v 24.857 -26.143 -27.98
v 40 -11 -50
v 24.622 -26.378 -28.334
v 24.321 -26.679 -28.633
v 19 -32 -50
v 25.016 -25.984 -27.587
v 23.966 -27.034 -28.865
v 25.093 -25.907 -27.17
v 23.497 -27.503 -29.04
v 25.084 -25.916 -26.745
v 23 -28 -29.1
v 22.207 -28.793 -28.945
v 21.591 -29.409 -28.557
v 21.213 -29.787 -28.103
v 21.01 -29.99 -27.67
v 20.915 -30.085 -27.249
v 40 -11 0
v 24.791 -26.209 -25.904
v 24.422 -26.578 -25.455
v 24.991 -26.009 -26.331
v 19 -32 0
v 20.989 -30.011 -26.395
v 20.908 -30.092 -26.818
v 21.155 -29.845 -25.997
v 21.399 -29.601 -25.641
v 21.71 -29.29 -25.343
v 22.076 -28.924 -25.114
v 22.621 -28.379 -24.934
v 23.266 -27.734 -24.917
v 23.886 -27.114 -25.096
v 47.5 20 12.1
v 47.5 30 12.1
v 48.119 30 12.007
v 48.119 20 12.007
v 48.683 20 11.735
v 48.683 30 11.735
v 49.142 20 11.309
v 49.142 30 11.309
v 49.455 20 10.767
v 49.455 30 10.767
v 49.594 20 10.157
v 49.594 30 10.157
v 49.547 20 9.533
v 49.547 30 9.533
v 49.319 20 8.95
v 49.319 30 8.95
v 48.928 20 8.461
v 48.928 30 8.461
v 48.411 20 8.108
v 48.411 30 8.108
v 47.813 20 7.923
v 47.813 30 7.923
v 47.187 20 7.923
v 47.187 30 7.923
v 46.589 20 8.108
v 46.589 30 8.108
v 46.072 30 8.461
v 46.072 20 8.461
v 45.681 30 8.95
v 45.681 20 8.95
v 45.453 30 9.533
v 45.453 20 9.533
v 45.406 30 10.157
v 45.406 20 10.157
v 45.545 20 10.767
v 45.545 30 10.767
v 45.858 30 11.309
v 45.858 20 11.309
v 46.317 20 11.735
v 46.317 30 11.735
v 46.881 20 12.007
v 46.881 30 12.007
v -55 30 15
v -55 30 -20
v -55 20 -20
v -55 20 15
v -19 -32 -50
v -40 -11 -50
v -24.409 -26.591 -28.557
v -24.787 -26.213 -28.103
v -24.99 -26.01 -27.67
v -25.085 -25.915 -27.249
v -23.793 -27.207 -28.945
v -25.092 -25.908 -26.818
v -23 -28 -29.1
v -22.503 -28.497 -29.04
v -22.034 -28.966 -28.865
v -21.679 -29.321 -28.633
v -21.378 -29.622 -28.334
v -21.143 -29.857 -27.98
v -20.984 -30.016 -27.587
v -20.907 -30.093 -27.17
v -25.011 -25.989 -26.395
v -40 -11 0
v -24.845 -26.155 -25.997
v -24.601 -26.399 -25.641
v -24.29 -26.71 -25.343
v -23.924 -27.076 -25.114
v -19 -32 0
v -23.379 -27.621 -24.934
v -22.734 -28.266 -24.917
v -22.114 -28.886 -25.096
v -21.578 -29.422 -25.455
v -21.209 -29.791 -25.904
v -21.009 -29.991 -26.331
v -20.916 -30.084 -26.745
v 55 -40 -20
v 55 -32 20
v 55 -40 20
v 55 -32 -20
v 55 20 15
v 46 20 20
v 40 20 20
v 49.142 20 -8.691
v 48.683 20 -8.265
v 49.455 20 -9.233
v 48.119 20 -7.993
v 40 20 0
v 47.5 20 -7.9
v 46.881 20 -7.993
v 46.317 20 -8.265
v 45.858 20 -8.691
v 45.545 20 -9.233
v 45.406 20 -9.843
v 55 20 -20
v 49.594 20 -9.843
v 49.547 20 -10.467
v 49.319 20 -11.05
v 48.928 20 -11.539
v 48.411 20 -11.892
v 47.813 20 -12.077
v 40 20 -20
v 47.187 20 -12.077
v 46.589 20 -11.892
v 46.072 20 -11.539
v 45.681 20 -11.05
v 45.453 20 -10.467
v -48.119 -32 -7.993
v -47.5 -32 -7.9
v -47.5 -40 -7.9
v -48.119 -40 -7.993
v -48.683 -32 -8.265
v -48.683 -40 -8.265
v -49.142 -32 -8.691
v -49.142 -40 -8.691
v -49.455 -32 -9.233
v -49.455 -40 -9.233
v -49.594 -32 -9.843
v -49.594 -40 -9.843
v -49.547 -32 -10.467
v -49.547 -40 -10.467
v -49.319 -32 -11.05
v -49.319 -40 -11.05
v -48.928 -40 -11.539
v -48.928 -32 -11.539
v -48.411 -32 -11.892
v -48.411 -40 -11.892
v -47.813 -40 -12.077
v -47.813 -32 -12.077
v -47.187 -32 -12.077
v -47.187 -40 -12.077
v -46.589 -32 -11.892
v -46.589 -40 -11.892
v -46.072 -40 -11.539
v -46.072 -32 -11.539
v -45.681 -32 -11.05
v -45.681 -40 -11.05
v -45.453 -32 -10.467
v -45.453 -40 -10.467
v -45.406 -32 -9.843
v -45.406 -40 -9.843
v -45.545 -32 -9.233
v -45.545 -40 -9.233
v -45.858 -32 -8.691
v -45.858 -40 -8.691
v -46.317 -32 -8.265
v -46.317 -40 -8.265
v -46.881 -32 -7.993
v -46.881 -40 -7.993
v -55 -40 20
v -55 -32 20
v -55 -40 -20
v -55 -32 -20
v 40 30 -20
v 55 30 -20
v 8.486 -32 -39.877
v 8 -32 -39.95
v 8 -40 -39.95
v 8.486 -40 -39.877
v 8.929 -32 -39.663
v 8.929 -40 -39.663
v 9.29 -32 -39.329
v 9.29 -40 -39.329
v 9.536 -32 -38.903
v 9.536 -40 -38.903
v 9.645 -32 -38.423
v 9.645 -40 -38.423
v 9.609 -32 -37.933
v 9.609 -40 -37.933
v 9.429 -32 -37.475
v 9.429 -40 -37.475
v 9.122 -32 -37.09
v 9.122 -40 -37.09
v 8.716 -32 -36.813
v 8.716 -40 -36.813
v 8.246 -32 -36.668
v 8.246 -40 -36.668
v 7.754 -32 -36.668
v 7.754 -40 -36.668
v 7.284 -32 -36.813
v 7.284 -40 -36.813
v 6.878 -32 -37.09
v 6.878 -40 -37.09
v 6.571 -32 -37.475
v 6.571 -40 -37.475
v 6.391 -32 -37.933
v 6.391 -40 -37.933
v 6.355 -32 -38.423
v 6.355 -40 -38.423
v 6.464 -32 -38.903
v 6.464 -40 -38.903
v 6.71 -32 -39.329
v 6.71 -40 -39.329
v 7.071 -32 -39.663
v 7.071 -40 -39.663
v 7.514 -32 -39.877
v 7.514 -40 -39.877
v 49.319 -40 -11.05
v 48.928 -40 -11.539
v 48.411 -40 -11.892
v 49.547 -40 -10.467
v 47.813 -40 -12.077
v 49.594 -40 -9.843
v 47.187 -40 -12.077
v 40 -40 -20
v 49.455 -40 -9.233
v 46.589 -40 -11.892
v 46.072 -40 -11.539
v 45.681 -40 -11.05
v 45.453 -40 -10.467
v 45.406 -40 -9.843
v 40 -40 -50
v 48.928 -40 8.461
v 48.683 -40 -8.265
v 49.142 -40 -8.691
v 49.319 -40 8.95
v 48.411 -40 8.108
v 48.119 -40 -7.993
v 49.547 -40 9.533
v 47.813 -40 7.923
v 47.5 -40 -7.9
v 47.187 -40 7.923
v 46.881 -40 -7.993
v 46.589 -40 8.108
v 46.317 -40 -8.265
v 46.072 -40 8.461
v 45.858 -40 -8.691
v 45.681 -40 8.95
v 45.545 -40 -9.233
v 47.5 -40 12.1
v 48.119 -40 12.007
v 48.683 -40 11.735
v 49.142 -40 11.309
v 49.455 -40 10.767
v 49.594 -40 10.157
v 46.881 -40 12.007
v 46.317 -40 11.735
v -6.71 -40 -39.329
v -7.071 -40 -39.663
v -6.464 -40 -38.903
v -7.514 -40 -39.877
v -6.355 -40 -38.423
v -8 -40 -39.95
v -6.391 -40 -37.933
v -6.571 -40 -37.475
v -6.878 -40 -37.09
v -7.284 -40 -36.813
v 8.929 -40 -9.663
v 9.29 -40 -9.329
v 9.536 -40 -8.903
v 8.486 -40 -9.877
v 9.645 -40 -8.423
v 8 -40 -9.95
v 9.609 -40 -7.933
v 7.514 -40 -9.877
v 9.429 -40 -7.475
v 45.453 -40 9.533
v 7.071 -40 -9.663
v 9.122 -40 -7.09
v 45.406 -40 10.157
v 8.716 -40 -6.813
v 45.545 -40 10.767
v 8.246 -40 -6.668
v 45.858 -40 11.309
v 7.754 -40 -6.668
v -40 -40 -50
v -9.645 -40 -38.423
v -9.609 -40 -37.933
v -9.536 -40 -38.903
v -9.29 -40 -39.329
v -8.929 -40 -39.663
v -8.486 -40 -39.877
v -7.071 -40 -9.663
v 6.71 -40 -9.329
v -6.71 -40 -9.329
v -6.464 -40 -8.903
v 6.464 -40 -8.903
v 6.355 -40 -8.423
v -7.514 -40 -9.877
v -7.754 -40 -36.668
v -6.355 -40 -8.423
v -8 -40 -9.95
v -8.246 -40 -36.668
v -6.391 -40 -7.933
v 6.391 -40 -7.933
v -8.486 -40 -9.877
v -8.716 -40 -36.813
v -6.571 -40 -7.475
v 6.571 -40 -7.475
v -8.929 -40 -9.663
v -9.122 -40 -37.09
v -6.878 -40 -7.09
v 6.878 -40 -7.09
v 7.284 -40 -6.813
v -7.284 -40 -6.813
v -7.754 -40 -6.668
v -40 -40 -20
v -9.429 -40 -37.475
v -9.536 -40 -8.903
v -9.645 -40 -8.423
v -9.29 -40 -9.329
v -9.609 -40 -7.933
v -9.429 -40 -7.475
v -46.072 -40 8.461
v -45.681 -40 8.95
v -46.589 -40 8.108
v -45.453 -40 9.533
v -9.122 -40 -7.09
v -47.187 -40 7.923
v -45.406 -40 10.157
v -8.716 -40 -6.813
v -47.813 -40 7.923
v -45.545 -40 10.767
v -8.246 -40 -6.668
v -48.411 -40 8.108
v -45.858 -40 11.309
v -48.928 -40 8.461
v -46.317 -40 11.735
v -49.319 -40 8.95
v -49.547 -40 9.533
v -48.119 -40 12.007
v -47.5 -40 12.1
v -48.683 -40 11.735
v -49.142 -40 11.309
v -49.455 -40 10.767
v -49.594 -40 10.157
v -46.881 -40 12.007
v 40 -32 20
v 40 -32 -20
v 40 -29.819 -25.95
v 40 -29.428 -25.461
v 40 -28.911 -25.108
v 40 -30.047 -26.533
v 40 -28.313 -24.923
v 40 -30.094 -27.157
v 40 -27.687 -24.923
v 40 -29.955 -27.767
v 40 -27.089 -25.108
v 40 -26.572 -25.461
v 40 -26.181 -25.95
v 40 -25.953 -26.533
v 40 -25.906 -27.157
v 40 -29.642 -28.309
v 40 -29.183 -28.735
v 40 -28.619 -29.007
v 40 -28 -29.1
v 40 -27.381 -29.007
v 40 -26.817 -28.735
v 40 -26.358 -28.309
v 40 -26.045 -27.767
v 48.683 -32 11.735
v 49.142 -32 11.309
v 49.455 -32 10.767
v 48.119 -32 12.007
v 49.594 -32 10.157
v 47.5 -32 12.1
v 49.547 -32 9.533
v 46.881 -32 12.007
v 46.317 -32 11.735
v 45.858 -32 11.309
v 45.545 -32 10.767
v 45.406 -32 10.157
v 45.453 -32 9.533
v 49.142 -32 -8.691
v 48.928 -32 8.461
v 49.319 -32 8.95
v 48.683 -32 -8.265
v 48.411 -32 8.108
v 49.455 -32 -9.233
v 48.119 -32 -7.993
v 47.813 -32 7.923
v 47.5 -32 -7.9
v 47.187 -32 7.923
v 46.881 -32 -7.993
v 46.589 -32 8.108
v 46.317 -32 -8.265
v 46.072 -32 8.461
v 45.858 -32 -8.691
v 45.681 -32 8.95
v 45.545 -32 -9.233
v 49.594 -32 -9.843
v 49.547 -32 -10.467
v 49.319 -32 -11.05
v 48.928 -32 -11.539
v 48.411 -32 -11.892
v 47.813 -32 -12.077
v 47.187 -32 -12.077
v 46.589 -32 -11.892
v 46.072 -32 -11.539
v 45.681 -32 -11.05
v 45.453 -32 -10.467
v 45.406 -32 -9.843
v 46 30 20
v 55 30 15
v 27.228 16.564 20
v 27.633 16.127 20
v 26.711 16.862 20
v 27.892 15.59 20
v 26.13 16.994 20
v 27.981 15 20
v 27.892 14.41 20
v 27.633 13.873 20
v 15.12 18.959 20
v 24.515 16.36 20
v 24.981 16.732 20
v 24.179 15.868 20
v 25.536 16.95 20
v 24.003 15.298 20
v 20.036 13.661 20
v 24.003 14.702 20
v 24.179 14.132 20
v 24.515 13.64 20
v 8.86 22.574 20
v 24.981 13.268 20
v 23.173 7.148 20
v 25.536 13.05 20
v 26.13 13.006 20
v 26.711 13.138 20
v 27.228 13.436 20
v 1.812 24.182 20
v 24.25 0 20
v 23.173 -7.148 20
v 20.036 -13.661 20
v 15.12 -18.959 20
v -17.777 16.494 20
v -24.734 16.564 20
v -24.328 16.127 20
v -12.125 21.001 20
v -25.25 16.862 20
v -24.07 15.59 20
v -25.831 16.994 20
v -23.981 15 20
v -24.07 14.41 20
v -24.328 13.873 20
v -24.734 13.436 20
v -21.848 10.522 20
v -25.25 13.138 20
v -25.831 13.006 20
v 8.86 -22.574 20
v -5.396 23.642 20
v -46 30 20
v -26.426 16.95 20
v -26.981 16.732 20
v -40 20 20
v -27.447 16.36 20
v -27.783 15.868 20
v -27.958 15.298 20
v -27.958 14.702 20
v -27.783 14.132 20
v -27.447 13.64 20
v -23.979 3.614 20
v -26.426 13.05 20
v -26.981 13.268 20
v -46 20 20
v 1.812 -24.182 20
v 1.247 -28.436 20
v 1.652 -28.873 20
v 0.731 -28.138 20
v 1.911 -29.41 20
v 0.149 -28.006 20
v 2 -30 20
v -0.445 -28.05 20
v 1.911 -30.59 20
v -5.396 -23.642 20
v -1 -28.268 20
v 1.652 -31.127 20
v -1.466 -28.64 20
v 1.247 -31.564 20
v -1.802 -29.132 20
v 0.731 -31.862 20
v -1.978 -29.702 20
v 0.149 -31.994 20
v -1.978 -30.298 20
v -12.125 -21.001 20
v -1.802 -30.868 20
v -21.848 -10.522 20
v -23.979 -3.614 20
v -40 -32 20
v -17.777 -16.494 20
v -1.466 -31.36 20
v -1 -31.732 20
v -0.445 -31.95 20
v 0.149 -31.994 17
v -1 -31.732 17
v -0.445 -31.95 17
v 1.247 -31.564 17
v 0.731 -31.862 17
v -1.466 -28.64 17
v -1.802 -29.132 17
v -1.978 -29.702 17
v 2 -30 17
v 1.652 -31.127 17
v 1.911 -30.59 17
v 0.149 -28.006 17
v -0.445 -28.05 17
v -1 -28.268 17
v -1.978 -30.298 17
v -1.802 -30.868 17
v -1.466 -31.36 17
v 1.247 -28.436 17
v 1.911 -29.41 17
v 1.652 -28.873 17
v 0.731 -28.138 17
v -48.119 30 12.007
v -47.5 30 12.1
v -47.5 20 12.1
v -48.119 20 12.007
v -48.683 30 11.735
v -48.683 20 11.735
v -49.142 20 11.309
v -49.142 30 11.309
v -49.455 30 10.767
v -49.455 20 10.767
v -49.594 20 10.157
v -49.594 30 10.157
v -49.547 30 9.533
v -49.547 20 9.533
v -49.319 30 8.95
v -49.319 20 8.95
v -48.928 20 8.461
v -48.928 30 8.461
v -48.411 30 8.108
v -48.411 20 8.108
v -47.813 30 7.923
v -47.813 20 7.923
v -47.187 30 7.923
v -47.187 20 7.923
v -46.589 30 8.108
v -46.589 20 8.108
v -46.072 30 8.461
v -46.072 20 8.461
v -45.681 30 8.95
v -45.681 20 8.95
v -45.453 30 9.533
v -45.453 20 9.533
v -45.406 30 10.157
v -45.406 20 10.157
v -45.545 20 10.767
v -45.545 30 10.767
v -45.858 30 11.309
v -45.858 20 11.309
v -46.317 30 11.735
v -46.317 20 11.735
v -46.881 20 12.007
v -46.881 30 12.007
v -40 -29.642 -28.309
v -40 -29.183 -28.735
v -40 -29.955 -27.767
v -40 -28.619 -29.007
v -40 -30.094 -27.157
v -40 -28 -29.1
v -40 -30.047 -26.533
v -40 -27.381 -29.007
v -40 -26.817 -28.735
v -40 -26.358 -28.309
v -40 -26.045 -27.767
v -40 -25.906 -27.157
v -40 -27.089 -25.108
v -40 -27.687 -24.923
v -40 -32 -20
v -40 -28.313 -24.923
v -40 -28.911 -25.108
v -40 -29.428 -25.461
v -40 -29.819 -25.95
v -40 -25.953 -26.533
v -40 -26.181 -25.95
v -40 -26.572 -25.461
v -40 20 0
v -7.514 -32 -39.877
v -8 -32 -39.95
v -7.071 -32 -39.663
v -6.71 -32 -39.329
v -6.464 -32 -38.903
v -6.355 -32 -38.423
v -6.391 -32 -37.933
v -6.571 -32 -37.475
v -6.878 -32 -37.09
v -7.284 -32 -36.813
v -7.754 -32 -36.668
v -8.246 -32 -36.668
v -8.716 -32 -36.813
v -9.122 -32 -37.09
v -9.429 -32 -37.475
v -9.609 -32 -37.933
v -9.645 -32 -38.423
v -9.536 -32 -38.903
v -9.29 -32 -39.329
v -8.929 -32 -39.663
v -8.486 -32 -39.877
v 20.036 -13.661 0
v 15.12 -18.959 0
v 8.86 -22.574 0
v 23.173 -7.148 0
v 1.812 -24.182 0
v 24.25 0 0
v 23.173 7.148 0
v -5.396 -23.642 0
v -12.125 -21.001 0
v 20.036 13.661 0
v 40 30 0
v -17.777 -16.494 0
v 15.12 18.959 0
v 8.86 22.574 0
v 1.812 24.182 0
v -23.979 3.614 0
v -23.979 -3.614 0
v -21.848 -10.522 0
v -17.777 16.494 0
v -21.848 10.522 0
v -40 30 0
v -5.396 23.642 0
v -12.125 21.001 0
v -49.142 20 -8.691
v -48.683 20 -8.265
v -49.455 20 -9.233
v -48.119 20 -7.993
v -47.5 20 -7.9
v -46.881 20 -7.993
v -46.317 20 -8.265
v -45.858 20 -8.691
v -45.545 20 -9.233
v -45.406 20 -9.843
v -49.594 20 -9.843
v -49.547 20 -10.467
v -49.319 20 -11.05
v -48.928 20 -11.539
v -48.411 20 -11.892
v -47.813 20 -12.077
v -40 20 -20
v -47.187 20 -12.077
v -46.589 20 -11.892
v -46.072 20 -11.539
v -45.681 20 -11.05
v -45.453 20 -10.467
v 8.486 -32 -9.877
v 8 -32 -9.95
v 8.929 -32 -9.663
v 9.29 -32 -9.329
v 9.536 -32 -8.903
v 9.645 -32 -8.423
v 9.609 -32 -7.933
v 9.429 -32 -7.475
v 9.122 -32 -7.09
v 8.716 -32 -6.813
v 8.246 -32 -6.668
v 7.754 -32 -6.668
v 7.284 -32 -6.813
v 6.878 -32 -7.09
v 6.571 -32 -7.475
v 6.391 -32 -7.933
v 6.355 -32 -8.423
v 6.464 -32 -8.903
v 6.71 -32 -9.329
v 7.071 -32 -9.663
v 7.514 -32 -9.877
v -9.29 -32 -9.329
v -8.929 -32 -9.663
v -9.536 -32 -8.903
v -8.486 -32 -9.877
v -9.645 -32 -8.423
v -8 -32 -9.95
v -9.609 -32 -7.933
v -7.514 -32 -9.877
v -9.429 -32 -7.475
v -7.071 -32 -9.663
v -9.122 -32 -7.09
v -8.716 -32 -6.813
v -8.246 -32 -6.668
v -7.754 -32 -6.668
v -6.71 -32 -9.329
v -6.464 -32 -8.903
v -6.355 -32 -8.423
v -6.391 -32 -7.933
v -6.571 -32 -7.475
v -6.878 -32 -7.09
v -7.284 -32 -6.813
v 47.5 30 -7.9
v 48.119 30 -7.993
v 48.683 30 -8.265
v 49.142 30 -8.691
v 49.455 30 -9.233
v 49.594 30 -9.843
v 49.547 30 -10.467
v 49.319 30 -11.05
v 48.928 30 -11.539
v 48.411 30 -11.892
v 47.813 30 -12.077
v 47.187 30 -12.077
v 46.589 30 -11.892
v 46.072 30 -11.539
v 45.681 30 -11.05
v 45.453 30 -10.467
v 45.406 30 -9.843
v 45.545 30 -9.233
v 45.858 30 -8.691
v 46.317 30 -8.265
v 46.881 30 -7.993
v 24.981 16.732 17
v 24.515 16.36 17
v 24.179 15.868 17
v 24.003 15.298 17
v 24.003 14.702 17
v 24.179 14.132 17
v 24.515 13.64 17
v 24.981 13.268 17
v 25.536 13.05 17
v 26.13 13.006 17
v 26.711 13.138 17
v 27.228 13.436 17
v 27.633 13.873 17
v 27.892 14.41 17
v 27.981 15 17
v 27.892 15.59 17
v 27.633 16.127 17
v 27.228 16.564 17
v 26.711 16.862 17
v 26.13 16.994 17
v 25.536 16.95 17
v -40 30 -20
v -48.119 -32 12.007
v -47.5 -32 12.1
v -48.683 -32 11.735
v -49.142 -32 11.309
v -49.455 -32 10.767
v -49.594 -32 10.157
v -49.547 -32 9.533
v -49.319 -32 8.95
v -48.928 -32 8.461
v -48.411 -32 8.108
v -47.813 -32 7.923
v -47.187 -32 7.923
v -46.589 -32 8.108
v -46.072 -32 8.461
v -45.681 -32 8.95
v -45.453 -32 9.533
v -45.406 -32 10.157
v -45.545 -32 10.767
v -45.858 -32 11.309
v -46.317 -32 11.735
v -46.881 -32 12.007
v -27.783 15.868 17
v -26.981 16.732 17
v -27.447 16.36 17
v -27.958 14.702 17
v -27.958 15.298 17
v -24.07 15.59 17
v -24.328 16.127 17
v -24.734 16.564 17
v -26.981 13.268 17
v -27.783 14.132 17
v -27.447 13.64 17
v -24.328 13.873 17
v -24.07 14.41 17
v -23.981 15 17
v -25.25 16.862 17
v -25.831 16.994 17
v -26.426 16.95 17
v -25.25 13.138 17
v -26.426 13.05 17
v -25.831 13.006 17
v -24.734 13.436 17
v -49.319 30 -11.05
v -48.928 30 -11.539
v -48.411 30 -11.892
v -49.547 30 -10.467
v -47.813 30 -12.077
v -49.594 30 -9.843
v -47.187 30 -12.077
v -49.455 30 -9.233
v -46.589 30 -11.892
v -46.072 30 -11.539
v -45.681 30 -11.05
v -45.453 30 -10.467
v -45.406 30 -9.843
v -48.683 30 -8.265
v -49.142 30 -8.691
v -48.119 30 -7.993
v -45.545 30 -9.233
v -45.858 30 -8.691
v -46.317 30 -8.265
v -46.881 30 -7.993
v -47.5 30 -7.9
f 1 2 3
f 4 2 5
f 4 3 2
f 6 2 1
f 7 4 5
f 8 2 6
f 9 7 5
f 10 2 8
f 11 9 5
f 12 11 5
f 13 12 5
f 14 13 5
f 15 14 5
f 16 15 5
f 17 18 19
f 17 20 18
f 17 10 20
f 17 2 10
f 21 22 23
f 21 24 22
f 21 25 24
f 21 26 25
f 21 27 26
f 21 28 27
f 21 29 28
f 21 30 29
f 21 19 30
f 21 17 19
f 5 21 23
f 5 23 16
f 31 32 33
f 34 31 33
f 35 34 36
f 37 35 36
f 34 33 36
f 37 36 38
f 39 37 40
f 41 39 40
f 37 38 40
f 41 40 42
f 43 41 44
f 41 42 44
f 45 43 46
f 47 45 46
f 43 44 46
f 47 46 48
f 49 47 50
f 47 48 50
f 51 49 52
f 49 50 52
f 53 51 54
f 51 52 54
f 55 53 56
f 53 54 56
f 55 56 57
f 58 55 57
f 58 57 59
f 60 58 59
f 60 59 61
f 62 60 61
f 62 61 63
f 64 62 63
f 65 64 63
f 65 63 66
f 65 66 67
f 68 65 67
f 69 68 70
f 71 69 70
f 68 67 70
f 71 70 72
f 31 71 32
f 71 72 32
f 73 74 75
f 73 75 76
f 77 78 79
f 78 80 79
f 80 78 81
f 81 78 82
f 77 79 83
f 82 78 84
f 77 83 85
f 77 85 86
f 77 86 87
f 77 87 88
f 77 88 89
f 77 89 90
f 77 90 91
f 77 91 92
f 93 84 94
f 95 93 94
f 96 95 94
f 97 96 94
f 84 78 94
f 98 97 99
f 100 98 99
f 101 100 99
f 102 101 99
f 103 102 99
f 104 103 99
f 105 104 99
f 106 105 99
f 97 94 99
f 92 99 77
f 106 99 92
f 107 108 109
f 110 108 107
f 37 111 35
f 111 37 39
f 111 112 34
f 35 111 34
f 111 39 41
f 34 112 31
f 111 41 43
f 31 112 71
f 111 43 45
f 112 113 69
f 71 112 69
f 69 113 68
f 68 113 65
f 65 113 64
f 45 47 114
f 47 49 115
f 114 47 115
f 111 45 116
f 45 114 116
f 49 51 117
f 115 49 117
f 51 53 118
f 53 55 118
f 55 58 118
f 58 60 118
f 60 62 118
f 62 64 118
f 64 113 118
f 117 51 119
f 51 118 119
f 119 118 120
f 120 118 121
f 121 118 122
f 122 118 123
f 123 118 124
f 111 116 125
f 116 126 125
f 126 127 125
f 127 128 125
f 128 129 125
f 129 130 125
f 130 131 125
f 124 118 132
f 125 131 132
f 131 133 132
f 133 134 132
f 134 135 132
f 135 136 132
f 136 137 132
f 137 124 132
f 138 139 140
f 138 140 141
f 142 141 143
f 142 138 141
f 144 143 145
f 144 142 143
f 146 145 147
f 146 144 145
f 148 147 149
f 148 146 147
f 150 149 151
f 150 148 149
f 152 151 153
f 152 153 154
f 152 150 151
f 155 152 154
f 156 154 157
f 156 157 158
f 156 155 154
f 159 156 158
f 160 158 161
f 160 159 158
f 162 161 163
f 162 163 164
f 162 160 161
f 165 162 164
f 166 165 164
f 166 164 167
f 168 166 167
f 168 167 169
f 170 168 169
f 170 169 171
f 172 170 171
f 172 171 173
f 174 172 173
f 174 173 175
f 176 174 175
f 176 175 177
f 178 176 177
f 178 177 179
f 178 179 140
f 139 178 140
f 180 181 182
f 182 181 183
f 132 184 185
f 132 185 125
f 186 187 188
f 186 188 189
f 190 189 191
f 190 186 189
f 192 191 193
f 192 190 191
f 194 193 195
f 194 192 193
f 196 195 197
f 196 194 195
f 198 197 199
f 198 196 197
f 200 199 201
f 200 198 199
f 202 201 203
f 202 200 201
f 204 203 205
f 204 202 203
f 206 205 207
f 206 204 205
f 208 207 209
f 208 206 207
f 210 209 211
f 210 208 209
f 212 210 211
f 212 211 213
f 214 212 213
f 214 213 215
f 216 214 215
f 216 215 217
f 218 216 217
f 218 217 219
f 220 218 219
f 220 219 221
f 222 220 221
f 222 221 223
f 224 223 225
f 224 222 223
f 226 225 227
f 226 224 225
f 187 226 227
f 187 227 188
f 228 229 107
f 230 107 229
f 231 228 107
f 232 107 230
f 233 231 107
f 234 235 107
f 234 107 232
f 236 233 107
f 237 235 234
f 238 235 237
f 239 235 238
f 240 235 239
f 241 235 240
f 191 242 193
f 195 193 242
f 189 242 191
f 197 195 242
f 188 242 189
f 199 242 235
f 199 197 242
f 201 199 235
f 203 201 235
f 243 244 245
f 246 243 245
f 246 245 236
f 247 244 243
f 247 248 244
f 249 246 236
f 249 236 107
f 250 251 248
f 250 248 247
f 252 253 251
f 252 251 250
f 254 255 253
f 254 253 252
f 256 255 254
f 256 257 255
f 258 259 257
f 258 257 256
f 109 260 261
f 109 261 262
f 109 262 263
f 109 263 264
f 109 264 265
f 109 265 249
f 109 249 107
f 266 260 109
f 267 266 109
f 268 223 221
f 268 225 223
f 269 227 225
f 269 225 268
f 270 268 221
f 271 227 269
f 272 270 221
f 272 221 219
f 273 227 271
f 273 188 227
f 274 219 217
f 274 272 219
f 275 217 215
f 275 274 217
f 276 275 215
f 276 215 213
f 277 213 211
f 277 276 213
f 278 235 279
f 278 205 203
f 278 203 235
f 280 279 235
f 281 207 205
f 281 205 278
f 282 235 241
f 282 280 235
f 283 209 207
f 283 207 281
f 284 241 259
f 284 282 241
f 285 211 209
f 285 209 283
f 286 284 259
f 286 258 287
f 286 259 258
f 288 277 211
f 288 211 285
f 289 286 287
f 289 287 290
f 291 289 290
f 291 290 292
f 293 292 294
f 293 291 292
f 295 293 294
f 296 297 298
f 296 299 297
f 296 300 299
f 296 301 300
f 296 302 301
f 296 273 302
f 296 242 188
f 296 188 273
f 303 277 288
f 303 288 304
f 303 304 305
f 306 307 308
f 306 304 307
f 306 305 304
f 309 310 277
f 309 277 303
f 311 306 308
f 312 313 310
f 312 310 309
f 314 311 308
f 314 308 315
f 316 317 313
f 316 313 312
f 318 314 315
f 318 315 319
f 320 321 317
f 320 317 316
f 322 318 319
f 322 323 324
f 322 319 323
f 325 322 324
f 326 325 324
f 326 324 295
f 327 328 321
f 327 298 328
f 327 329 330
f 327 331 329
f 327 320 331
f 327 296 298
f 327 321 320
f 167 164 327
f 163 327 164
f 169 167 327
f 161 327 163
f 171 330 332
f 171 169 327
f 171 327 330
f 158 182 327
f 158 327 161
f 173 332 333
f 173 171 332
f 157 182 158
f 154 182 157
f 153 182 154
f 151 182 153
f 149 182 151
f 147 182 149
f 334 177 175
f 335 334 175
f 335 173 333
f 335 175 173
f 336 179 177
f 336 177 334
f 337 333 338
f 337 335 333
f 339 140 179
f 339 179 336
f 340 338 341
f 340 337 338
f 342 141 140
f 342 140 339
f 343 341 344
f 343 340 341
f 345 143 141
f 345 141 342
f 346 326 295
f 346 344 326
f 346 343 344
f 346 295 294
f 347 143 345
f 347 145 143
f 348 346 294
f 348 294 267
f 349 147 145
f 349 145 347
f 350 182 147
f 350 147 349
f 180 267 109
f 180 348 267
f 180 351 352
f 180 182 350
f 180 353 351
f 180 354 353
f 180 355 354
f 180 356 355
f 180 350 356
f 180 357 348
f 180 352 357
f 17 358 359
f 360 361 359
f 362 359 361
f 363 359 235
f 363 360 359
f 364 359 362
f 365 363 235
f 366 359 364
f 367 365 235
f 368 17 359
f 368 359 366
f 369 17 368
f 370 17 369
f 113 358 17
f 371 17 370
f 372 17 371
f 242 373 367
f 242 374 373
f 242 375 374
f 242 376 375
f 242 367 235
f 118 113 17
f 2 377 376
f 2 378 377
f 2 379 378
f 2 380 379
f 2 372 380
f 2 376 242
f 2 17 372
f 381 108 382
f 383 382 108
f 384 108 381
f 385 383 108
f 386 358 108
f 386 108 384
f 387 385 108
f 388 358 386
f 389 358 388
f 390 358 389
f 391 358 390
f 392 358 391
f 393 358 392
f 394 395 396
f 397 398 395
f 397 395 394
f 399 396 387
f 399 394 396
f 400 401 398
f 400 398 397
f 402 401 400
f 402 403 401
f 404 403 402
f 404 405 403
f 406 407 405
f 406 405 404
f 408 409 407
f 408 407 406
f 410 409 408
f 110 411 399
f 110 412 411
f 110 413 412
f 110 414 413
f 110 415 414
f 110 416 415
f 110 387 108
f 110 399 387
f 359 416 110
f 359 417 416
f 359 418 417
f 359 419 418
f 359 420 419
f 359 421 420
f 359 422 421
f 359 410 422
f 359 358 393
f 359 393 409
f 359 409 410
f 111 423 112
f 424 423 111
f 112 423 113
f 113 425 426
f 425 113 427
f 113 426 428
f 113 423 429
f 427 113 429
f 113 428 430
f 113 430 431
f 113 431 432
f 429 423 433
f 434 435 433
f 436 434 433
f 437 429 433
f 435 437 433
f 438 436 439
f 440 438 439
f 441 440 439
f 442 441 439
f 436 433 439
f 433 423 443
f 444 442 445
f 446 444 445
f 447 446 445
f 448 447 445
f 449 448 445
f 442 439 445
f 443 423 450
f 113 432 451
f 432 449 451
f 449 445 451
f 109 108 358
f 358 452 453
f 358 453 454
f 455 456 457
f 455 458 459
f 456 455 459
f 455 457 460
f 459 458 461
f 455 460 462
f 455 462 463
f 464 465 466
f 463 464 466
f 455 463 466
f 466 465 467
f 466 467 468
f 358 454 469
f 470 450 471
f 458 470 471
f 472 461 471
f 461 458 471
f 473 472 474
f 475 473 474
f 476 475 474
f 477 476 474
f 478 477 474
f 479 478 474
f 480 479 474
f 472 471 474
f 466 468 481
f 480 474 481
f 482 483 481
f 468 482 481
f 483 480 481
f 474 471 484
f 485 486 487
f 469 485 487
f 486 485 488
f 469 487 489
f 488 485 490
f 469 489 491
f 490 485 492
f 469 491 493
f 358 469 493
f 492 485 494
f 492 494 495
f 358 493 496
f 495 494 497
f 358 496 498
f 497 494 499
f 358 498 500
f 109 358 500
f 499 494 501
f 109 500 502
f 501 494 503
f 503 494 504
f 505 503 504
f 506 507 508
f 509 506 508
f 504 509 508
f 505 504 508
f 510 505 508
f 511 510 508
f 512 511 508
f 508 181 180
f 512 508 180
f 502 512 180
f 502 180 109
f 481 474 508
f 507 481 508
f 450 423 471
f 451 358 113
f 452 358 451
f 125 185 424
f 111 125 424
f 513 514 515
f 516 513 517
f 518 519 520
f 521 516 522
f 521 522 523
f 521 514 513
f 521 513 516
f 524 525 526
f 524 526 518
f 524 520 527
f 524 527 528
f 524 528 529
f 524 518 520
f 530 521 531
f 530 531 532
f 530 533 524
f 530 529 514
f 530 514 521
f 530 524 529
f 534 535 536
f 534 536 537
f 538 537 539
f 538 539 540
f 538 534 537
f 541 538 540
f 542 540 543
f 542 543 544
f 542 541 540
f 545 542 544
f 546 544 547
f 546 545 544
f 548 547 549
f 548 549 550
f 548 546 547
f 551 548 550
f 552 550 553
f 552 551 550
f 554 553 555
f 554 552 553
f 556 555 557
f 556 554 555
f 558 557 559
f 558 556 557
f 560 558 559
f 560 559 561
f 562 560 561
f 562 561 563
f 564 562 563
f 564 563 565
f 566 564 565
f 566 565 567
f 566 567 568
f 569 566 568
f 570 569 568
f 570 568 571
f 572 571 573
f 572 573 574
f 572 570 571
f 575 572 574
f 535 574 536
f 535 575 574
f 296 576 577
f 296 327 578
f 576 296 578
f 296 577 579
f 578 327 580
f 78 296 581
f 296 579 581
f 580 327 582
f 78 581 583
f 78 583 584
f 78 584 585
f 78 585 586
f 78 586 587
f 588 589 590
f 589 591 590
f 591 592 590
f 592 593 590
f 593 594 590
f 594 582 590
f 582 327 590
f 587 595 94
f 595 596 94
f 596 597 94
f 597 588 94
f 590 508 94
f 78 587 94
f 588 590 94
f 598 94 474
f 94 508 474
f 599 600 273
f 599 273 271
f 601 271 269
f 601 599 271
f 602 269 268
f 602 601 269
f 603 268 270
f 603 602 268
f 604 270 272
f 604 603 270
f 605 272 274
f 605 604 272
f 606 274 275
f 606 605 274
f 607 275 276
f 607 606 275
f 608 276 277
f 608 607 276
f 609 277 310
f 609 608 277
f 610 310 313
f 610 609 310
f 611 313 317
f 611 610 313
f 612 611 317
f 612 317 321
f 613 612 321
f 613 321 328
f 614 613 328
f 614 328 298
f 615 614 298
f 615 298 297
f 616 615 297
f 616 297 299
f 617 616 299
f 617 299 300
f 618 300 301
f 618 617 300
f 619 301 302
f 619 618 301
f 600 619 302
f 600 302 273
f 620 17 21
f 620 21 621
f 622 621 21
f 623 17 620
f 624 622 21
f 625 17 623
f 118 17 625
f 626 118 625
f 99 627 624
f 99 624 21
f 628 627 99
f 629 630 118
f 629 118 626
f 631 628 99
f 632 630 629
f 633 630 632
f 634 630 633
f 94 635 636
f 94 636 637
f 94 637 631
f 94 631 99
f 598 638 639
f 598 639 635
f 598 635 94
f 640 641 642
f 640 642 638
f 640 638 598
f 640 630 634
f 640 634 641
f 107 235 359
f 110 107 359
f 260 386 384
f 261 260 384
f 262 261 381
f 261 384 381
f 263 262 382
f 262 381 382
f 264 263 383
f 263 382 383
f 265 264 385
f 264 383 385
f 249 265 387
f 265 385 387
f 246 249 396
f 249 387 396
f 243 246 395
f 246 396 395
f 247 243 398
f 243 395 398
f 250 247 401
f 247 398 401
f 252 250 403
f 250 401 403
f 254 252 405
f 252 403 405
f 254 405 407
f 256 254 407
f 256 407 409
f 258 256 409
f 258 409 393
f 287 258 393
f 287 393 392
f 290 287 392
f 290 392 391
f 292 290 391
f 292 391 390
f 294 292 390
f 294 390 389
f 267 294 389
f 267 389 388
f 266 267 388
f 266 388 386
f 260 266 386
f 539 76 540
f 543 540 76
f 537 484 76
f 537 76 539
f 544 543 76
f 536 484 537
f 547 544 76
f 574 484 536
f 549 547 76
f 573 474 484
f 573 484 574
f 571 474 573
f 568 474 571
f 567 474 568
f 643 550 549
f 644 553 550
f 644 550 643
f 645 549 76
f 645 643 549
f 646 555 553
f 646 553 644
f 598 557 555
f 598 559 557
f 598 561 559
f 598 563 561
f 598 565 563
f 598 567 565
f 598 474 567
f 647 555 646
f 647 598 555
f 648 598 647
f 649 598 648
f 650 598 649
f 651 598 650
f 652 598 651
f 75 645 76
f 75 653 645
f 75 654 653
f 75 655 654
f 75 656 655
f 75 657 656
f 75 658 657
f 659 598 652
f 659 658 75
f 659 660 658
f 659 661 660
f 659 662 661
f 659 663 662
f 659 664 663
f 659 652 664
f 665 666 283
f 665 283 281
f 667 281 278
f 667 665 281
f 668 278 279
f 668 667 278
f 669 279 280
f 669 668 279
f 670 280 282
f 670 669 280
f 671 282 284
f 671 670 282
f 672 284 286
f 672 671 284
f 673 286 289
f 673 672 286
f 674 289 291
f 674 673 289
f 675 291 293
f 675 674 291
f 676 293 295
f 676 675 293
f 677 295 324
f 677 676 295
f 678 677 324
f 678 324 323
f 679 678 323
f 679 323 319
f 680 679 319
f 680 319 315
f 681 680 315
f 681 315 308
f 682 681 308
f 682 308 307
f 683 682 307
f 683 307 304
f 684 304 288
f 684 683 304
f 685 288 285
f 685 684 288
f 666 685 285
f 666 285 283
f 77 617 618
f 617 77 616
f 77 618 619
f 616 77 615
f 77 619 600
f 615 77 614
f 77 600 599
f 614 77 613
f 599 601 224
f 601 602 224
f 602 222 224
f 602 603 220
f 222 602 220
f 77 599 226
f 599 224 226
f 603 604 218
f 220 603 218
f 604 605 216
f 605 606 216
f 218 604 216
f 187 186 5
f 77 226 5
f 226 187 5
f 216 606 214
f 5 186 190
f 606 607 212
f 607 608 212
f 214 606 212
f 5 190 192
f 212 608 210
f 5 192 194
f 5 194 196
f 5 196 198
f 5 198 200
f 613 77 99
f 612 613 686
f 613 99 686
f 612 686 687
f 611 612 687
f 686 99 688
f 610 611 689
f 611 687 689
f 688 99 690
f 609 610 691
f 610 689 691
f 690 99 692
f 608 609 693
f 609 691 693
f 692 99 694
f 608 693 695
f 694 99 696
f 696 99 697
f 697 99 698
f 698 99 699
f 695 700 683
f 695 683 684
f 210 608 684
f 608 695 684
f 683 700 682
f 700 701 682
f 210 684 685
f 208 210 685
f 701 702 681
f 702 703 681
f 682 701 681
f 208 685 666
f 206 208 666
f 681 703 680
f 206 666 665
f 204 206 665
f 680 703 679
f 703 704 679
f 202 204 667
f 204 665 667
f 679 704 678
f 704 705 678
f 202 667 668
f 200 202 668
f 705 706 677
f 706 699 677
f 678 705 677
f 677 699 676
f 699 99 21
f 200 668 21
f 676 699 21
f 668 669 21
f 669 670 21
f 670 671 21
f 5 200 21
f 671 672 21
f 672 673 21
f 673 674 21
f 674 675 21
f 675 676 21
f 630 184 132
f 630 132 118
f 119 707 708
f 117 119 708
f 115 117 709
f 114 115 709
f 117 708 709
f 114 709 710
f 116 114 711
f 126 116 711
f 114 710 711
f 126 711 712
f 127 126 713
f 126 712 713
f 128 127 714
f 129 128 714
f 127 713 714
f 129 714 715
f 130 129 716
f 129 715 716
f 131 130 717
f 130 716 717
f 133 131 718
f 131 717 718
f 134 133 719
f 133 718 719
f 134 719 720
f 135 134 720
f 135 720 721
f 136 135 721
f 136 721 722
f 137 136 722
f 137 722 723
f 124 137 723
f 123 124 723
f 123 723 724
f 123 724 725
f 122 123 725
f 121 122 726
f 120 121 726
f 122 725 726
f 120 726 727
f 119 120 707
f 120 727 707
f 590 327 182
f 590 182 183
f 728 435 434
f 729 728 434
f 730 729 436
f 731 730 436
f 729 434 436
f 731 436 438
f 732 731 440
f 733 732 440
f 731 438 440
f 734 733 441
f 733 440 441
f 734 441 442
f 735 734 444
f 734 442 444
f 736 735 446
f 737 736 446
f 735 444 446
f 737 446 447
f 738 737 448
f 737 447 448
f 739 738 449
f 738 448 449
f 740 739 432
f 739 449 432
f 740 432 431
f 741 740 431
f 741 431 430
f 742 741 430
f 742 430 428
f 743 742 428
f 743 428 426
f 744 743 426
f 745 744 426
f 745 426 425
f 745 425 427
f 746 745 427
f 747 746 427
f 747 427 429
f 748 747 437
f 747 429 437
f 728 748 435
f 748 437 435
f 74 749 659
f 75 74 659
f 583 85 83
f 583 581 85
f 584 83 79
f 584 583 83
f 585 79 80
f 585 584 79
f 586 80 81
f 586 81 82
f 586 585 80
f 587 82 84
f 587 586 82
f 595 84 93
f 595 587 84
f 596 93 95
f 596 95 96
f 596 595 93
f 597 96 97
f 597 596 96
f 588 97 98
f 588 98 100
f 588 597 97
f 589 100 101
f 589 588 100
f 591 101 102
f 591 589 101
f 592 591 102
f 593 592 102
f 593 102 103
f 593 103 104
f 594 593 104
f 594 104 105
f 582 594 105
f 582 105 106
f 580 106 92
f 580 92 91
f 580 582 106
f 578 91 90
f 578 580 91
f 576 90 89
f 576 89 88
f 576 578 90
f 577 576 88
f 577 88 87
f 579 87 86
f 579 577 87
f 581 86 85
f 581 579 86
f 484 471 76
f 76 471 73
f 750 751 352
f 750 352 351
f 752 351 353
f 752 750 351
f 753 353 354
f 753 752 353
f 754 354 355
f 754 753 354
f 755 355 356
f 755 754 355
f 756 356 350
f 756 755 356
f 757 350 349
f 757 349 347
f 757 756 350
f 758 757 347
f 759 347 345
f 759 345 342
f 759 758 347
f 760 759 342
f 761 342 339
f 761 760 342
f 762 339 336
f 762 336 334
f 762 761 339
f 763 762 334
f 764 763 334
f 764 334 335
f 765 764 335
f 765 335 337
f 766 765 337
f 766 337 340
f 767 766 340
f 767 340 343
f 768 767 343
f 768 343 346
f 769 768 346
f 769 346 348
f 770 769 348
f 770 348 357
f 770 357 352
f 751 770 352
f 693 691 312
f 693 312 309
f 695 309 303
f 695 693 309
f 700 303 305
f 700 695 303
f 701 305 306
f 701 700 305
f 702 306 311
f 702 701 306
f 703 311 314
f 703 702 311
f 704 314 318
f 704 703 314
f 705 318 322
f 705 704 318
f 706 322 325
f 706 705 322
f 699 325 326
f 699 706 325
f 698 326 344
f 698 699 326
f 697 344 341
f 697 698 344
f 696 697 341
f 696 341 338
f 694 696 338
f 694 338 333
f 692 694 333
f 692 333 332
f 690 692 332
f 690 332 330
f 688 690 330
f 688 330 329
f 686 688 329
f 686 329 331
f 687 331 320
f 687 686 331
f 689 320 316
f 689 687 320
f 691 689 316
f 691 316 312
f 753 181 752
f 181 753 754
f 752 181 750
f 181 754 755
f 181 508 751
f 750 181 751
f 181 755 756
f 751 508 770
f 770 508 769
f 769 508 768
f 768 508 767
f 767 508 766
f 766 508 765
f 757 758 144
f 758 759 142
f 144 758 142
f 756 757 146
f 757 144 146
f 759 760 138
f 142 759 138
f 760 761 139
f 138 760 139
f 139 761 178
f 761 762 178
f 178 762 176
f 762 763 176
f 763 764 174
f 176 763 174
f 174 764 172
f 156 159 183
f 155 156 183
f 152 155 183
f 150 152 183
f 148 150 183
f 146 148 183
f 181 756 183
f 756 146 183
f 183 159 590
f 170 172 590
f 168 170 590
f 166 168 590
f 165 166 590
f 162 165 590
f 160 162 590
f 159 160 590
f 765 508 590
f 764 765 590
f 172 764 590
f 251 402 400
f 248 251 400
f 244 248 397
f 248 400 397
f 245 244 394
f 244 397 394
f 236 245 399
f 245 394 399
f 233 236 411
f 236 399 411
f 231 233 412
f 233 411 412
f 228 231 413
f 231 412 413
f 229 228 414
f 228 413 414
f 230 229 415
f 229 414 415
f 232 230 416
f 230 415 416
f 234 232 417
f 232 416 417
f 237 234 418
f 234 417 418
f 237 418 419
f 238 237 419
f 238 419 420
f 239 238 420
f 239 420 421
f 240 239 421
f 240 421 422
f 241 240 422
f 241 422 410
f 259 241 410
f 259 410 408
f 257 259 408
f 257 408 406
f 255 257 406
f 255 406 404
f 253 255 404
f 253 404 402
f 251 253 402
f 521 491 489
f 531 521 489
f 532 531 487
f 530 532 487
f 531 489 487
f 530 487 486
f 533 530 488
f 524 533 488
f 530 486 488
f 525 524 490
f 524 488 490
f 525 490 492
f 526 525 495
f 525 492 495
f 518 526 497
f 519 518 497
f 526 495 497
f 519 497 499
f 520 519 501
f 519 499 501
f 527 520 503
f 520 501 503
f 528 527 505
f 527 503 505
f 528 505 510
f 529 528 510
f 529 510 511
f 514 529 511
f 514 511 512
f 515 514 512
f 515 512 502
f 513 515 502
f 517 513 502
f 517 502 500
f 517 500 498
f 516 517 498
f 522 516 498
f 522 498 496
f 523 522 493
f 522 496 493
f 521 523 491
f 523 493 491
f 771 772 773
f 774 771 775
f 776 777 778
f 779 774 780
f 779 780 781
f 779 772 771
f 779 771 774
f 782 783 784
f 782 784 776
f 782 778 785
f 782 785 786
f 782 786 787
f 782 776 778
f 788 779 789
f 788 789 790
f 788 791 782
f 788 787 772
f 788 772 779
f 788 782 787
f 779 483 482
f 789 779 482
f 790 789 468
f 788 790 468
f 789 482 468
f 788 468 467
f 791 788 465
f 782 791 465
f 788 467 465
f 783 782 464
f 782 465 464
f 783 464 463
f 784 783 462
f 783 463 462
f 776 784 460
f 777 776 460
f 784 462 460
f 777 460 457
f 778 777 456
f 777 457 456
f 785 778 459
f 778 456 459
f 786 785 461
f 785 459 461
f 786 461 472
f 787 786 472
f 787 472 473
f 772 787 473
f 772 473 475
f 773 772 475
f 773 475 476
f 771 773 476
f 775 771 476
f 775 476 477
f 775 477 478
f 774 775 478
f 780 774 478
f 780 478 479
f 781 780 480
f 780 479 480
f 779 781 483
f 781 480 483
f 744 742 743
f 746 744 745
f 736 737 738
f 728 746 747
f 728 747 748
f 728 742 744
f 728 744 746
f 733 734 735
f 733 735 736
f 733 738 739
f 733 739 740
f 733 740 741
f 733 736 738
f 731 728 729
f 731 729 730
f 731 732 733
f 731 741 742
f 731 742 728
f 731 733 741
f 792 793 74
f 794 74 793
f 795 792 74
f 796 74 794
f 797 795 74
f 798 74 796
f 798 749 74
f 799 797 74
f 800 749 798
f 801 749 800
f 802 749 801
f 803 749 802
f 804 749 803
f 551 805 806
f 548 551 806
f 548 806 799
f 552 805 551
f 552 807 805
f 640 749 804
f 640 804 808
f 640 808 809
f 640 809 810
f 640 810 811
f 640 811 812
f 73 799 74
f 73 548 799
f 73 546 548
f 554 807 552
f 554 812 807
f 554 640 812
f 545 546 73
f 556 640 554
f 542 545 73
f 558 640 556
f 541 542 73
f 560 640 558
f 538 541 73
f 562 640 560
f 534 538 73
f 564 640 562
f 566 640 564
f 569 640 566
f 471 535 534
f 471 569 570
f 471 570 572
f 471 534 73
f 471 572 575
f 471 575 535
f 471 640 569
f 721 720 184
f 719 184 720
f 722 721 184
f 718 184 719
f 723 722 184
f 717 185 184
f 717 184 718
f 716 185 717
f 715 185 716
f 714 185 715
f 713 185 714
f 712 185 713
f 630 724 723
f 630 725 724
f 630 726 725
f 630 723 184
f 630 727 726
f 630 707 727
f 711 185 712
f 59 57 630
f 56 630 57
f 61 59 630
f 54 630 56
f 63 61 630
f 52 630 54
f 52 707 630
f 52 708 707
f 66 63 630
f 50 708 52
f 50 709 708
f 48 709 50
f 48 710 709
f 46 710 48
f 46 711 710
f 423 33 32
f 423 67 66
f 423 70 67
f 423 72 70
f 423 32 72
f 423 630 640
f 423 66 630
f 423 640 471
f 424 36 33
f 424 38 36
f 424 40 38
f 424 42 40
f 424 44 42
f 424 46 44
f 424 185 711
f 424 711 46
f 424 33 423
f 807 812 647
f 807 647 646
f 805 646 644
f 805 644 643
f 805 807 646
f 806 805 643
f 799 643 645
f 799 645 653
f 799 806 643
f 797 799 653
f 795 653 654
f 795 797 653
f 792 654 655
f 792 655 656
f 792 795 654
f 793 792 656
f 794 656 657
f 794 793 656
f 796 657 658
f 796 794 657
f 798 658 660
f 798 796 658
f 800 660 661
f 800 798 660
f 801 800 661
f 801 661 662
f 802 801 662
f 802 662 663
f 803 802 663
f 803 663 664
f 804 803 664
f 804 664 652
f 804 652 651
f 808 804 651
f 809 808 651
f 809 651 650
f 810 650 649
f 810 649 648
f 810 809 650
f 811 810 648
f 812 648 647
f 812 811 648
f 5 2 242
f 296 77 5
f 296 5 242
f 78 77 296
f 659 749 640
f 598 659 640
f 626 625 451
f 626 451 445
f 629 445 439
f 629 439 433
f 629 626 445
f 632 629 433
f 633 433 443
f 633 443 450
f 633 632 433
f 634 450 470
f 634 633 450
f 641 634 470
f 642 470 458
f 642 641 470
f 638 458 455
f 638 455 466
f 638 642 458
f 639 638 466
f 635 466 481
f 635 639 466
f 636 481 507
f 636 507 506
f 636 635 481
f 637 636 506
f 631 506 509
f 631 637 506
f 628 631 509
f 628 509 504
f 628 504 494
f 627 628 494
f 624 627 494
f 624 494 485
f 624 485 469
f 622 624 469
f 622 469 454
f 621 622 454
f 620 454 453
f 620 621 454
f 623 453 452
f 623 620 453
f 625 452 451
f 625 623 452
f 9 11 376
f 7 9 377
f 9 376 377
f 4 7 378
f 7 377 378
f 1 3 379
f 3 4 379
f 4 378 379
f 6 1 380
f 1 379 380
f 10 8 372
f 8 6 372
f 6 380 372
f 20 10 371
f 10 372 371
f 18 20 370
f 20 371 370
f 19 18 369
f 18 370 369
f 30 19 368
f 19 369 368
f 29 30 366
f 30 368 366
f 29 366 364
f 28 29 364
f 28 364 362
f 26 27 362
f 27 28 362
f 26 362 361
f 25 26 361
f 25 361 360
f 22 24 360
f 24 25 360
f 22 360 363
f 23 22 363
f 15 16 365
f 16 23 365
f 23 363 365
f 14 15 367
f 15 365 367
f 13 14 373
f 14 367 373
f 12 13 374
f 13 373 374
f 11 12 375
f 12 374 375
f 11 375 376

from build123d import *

# Parameters (mm, degrees)
SKETCH1_W           = 80
SKETCH1_H           = 60
SKETCH1_R           = 24.25
BOSS_EXTRUDE1_DEPTH = 20
BOSS_EXTRUDE3_DEPTH = 15
SKETCH5_R           = 2.1
CUT_EXTRUDE2_DEPTH  = 10
SKETCH6_W           = 80
SKETCH6_H           = 20
BOSS_EXTRUDE4_DEPTH = 2
BOSS_EXTRUDE6_DEPTH = 50
SKETCH9_R           = 2.1
CUT_EXTRUDE3_DEPTH  = 100.619275243
SKETCH12_W          = 80
SKETCH12_H          = 70
SKETCH12_R          = 1.65
BOSS_EXTRUDE8_DEPTH = 8
BOSS_EXTRUDE9_DEPTH = 15
CUT_EXTRUDE4_START  = -10
SKETCH14_R          = 2.1
CUT_EXTRUDE4_DEPTH  = 10
SKETCH16_R          = 2
CUT_EXTRUDE5_DEPTH  = 3
CIRPATTERN1_COUNT   = 3


with BuildPart() as part:
    # Sketch1 → Boss-Extrude1 (new body)
    with BuildSketch(Plane.XY):
        Rectangle(SKETCH1_W, SKETCH1_H)
        Circle(SKETCH1_R, mode=Mode.SUBTRACT)
    extrude(amount=BOSS_EXTRUDE1_DEPTH)

    # Sketch4 → Boss-Extrude3 (add)
    with BuildSketch(Plane(origin=(40, 0, 0), x_dir=(0, 0, -1), z_dir=(1, 0, 0))):
        Polygon((-20, 30), (0, 30), (20, 30), (20, 20), (0, 20), (-20, 20), align=None)
    boss_extrude3 = extrude(amount=BOSS_EXTRUDE3_DEPTH)

    # Sketch5 → Cut-Extrude2 (cut)
    with BuildSketch(Plane(origin=(0, 30, 0), x_dir=(1, 0, 0), z_dir=(0, 1, 0))):
        with Locations(Location((47.5, -10, 0), (0, 0, 270))):
            Circle(SKETCH5_R)
        with Locations(Location((47.5, 10, 0), (0, 0, 270))):
            Circle(SKETCH5_R)
        Polygon((46, -20), (55, -15), (55, -20), align=None)
    cut_extrude2 = extrude(amount=-CUT_EXTRUDE2_DEPTH, mode=Mode.SUBTRACT)

    # Sketch6 → Boss-Extrude4 (add)
    with BuildSketch(Plane(origin=(0, -30, 0), x_dir=(-1, 0, 0), z_dir=(0, -1, 0))):
        with Locations((0, -10)):
            Rectangle(SKETCH6_W, SKETCH6_H)
    boss_extrude4 = extrude(amount=BOSS_EXTRUDE4_DEPTH)

    # Sketch8 → Boss-Extrude6 (add)
    with BuildSketch(Plane(origin=(0, 0, 0), x_dir=(-1, 0, 0), z_dir=(0, 0, -1))):
        Polygon((-40, -11), (-19, -32), (-40, -32), align=None)
    boss_extrude6 = extrude(amount=BOSS_EXTRUDE6_DEPTH)

    # Sketch9 → Cut-Extrude3 (cut, through all)
    with BuildSketch(Plane(origin=(40, 0, 0), x_dir=(0, 0, -1), z_dir=(1, 0, 0))):
        with Locations((27, -28)):
            Circle(SKETCH9_R)
    cut_extrude3 = extrude(amount=-CUT_EXTRUDE3_DEPTH, mode=Mode.SUBTRACT)

    # Sketch12 → Boss-Extrude8 (add)
    with BuildSketch(Plane.XZ.offset(32)):
        with Locations((0, -15)):
            Rectangle(SKETCH12_W, SKETCH12_H)
        with Locations(Location((-8, -8.3, 0), (0, 0, 270))):
            Circle(SKETCH12_R, mode=Mode.SUBTRACT)
        with Locations(Location((8, -8.3, 0), (0, 0, 270))):
            Circle(SKETCH12_R, mode=Mode.SUBTRACT)
        with Locations(Location((8, -38.3, 0), (0, 0, 270))):
            Circle(SKETCH12_R, mode=Mode.SUBTRACT)
        with Locations(Location((-8, -38.3, 0), (0, 0, 270))):
            Circle(SKETCH12_R, mode=Mode.SUBTRACT)
    extrude(amount=BOSS_EXTRUDE8_DEPTH)

    # Mirror1: Boss-Extrude3, Cut-Extrude2, Boss-Extrude4, Boss-Extrude6, Cut-Extrude3 across plane
    add(boss_extrude3.mirror(Plane(origin=(0, 0, 0), x_dir=(0, 0, 1), z_dir=(1, 0, 0))))
    add(cut_extrude2.mirror(Plane(origin=(0, 0, 0), x_dir=(0, 0, 1), z_dir=(1, 0, 0))), mode=Mode.SUBTRACT)
    add(boss_extrude4.mirror(Plane(origin=(0, 0, 0), x_dir=(0, 0, 1), z_dir=(1, 0, 0))))
    add(boss_extrude6.mirror(Plane(origin=(0, 0, 0), x_dir=(0, 0, 1), z_dir=(1, 0, 0))))
    add(cut_extrude3.mirror(Plane(origin=(0, 0, 0), x_dir=(0, 0, 1), z_dir=(1, 0, 0))), mode=Mode.SUBTRACT)

    # Sketch13 → Boss-Extrude9 (add)
    with BuildSketch(Plane.ZY.offset(40)):
        Polygon((20, -40), (0, -40), (-20, -40), (-20, -32), (0, -32), (20, -32), align=None)
    boss_extrude9 = extrude(amount=BOSS_EXTRUDE9_DEPTH)

    # Sketch14 → Cut-Extrude4 (cut)
    with BuildSketch(Plane.XZ.offset(40).offset(CUT_EXTRUDE4_START)):
        with Locations(Location((-47.5, 10, 0), (0, 0, 90))):
            Circle(SKETCH14_R)
        with Locations(Location((-47.5, -10, 0), (0, 0, 90))):
            Circle(SKETCH14_R)
    cut_extrude4 = extrude(amount=CUT_EXTRUDE4_DEPTH, mode=Mode.SUBTRACT)

    # Mirror2: Boss-Extrude9, Cut-Extrude4 across plane
    add(boss_extrude9.mirror(Plane(origin=(0, 0, 0), x_dir=(0, 0, 1), z_dir=(1, 0, 0))))
    add(cut_extrude4.mirror(Plane(origin=(0, 0, 0), x_dir=(0, 0, 1), z_dir=(1, 0, 0))), mode=Mode.SUBTRACT)

    # Sketch16 → Cut-Extrude5 (cut)
    with BuildSketch(Plane.XY.offset(20)):
        with Locations((0, -30)):
            Circle(SKETCH16_R)
    cut_extrude5 = extrude(amount=-CUT_EXTRUDE5_DEPTH, mode=Mode.SUBTRACT)

    # CirPattern1: Cut-Extrude5 ×3 about axis
    cirpattern1_axis = Axis((0, 0, 0), (0, 0, 1))
    for i in range(1, CIRPATTERN1_COUNT):
        add(cut_extrude5.rotate(cirpattern1_axis, i * 360 / CIRPATTERN1_COUNT), mode=Mode.SUBTRACT)


solid = part.part
